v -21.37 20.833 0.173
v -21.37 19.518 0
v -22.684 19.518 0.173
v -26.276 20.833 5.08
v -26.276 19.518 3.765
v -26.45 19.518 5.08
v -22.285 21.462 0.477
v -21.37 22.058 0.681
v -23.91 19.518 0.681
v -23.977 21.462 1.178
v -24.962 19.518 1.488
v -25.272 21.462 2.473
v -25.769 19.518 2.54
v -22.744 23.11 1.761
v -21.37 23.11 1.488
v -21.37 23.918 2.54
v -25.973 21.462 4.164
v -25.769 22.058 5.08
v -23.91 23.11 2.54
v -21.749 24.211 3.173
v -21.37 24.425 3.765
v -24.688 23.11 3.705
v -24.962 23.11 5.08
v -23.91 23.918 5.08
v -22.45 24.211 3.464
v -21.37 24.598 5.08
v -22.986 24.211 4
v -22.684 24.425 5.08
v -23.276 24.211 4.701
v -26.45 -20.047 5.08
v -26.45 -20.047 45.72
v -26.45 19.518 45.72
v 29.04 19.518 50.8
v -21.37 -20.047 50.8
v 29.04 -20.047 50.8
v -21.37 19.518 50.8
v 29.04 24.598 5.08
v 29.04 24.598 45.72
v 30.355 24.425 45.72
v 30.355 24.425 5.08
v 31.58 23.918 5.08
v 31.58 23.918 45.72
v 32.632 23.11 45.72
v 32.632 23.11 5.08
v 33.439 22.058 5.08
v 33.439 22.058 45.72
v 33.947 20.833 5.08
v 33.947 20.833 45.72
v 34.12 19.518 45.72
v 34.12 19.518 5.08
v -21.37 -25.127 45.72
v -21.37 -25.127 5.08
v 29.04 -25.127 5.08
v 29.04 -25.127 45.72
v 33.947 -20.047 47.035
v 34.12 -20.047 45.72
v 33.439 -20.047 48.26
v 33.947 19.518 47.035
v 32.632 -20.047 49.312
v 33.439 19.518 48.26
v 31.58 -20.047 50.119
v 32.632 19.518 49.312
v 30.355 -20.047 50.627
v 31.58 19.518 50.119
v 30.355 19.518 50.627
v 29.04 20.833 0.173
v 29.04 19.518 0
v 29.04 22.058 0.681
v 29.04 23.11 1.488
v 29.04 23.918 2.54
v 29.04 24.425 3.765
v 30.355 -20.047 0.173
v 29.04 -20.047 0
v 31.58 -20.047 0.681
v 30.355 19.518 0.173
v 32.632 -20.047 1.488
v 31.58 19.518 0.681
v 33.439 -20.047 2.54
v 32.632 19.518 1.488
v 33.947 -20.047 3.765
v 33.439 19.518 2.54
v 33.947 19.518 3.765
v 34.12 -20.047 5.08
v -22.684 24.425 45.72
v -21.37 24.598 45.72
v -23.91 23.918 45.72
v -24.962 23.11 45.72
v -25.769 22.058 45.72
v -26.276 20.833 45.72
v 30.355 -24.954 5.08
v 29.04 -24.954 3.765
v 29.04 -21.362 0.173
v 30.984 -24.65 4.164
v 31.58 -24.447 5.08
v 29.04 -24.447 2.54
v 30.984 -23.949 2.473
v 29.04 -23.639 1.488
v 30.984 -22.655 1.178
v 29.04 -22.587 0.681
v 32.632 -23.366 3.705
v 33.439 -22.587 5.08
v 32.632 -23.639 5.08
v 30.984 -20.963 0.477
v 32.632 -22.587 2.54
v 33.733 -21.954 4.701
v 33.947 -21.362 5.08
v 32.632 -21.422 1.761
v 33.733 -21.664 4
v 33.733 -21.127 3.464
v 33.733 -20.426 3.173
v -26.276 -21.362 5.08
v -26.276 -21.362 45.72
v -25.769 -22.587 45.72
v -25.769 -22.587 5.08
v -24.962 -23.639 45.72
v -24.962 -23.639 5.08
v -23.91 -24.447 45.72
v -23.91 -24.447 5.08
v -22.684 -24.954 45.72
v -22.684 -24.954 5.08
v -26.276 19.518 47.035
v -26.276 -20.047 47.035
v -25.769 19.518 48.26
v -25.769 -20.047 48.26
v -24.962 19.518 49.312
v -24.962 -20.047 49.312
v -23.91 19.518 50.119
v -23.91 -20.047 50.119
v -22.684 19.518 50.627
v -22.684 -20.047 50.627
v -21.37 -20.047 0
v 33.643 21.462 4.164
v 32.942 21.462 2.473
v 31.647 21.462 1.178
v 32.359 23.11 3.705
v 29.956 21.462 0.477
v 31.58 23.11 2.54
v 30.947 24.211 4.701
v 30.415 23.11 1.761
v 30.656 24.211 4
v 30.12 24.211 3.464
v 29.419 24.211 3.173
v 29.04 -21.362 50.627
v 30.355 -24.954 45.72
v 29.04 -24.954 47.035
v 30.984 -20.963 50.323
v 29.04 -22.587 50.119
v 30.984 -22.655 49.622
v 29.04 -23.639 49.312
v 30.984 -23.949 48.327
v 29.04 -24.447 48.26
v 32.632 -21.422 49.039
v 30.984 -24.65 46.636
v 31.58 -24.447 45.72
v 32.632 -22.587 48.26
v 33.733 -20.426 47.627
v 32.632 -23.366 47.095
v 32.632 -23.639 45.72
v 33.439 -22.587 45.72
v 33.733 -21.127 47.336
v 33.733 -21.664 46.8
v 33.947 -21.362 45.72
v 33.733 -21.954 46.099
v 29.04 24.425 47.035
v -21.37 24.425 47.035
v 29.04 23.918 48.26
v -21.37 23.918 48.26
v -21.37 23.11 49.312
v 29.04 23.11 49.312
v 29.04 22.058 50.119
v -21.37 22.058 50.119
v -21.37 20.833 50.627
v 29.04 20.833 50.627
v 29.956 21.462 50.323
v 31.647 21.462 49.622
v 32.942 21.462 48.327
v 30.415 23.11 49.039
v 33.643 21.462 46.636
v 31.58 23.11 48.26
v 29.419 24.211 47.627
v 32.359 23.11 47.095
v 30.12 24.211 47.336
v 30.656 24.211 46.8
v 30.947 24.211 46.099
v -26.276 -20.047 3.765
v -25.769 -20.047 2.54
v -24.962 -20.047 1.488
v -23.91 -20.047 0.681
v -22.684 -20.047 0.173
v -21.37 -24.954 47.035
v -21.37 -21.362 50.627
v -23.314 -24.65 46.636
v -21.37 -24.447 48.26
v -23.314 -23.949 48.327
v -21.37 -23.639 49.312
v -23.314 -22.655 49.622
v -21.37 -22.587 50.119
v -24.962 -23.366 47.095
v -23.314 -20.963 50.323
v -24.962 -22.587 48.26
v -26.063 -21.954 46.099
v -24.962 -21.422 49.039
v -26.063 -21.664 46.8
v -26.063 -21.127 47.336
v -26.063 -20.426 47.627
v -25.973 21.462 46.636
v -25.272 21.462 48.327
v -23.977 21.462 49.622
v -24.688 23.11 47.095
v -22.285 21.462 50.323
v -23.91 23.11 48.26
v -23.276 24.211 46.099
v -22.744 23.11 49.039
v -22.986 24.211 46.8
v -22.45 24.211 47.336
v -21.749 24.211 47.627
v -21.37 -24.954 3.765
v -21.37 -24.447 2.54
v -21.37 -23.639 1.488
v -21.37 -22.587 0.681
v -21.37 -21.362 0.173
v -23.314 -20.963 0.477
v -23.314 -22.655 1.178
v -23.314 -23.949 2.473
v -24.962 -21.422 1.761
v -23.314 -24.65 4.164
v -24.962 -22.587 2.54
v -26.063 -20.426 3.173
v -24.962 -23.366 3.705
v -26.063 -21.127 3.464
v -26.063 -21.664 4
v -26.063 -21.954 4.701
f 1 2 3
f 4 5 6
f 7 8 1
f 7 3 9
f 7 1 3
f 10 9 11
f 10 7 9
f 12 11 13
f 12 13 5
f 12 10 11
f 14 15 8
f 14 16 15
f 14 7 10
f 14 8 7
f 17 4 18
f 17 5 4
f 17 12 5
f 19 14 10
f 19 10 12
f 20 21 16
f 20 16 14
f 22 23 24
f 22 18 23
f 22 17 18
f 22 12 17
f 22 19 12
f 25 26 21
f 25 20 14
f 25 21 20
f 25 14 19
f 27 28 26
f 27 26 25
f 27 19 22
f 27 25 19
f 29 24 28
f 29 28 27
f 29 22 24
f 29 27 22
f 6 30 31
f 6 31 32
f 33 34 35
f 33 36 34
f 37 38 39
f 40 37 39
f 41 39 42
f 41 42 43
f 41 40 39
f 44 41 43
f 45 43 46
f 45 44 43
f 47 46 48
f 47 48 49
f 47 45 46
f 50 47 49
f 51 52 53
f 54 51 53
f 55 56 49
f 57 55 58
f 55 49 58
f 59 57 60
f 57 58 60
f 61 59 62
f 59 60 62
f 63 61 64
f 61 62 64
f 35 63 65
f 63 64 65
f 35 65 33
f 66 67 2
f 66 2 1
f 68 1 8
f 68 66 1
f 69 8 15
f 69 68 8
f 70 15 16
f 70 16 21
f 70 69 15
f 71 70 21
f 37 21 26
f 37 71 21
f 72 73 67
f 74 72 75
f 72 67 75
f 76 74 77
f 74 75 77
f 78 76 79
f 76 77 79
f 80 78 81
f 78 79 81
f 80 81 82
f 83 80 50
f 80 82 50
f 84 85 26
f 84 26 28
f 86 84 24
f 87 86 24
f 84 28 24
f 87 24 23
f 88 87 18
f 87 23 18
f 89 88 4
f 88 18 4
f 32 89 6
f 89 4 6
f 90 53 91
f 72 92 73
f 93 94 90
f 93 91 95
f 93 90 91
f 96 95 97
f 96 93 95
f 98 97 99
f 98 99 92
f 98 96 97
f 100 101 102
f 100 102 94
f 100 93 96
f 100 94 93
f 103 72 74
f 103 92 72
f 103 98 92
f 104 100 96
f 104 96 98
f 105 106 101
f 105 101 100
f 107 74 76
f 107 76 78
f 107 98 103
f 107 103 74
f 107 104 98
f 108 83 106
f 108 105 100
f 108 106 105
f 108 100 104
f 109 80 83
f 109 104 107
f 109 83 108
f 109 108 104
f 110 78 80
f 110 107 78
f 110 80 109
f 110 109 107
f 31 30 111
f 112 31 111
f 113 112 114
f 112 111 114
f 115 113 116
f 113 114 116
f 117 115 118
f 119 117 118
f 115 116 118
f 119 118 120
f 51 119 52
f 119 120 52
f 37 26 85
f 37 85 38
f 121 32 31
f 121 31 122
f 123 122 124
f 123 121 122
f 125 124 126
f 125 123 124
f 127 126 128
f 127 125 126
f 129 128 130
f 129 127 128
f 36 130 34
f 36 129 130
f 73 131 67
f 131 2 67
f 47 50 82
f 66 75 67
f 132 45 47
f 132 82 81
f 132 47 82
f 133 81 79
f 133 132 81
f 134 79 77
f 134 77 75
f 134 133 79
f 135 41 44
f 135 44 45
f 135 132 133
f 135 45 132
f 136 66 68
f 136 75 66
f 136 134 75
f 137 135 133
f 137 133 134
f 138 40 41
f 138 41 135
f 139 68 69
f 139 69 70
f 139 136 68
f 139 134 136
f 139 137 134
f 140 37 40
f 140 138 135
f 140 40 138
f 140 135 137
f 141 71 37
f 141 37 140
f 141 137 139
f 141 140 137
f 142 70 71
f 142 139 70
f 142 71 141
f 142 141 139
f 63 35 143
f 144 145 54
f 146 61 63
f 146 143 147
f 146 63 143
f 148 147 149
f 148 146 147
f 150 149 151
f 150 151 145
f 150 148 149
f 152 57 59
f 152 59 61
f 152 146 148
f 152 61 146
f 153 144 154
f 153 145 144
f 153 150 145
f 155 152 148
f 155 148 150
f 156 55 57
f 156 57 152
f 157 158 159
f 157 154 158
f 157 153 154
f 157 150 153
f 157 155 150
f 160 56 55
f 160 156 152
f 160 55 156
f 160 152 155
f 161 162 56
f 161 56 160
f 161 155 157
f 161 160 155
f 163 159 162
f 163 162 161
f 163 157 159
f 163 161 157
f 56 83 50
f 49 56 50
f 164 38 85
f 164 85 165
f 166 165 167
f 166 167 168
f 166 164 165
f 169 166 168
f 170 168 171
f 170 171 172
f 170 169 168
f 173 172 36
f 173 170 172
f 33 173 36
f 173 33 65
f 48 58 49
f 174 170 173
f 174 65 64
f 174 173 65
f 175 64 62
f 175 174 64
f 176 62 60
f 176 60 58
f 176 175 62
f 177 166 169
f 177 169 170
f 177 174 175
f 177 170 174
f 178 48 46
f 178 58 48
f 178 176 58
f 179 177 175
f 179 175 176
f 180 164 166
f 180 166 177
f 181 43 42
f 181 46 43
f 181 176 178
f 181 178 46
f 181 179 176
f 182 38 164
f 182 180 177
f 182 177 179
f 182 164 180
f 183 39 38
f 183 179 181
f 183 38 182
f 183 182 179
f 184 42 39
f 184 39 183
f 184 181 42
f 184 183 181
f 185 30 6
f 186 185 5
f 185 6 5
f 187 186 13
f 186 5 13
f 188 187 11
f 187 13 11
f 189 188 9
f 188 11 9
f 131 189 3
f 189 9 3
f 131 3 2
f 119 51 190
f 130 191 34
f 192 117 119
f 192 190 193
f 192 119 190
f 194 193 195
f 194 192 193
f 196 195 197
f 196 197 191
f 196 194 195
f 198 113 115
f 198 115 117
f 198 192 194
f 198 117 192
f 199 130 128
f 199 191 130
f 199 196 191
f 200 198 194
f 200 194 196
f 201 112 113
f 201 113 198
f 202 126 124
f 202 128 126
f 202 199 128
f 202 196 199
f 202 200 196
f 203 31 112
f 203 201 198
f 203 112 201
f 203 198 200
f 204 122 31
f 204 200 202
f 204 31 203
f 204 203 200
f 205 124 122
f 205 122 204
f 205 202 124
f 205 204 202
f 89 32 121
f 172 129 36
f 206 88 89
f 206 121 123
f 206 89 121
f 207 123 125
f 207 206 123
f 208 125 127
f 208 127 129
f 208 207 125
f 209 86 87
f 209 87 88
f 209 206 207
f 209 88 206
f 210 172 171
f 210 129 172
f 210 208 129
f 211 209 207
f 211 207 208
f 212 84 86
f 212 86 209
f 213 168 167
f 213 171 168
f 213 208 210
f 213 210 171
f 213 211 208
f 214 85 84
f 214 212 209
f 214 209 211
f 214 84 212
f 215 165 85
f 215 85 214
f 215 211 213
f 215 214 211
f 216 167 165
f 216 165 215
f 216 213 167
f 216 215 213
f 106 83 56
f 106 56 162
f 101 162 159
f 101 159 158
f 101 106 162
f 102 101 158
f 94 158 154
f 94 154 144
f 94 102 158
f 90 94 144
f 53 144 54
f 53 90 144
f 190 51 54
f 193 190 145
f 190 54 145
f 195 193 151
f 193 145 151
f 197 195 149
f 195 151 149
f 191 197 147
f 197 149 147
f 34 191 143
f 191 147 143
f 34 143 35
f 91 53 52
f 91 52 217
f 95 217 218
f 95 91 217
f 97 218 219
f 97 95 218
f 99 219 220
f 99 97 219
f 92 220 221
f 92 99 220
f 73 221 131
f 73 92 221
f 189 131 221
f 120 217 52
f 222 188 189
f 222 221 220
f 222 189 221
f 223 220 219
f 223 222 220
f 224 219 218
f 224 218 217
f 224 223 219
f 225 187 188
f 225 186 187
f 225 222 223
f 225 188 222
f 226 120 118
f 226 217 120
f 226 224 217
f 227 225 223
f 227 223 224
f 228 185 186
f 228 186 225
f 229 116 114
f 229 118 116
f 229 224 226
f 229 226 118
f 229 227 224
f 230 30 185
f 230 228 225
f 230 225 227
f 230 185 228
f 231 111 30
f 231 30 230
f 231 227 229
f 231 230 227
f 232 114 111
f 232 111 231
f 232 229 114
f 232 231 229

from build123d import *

# Parameters (mm, degrees)
F0_W         = 60.5695545673
F0_H         = 49.7252251953
F1_DEPTH     = 50.8
F2_R         = 5.08
F3_R         = 5.08
F4_T1_DEPTH  = 40.64
F4_S5_W      = 5.08
F4_S5_H      = 5.08
F4_T6_DEPTH  = 5.08
F4_S11_W     = 5.08
F4_S11_H     = 5.08
F4_T12_DEPTH = 5.08
F4_S17_W     = 5.08
F4_S17_H     = 5.08
F4_T18_DEPTH = 5.08
F4_S23_W     = 5.08
F4_S23_H     = 5.08
F4_T24_DEPTH = 5.08
F4_S29_W     = 5.08
F4_S29_H     = 5.08
F4_T30_DEPTH = 5.08
F4_S35_W     = 5.08
F4_S35_H     = 5.08
F4_T36_DEPTH = 5.08
F4_S41_W     = 5.08
F4_S41_H     = 5.08
F4_T42_DEPTH = 5.08
F4_S47_W     = 5.08
F4_S47_H     = 5.08
F4_T48_DEPTH = 5.08


# Not quite as in the source:
# - a fillet or chamfer that OpenCascade refuses, or shapes differently, is made with other operations: its cross-section is extruded or revolved along the edge and cut away or added


with BuildPart() as f1:
    # F0 (on Top) → F1 (new body)
    with BuildSketch(Plane.XY):
        with Locations((3.8351900876, -0.2644965425)):
            Rectangle(F0_W, F0_H)
    extrude(amount=F1_DEPTH)

    # F2
    f2_edges = [f1.edges().sort_by_distance(p)[0] for p in [
        (3.83519, -25.127109, 50.8),
        (-26.449587, -0.264497, 50.8),
        (3.83519, 24.598116, 50.8),
        (34.119967, -0.264497, 50.8),
    ]]
    fillet(f2_edges, radius=F2_R)

    # F3
    f3_edges = [f1.edges().sort_by_distance(p)[0] for p in [
        (3.83519, -25.127109, 0),
        (34.119967, -0.264497, 0),
        (3.83519, 24.598116, 0),
        (-26.449587, -0.264497, 0),
    ]]
    fillet(f3_edges, radius=F3_R)

    # F4: fillet of radius 5.08 on 4 edges, made by hand

    # F4_s2 → F4_t1 (cut)
    with BuildSketch(Plane.XY.offset(5.08)):
        with BuildLine():
            ThreePointArc((-21.3695871961, 24.5981160551), (-24.9616896445, 23.1102185036), (-26.4495871961, 19.5181160551))
            Line((-26.4495871961, 19.5181160551), (-26.4495871961, 24.5981160551))
            Line((-26.4495871961, 24.5981160551), (-21.3695871961, 24.5981160551))
        make_face()
        with BuildLine():
            ThreePointArc((-26.4495871961, -20.0471091402), (-24.9616896445, -23.6392115886), (-21.3695871961, -25.1271091402))
            Line((-21.3695871961, -25.1271091402), (-26.4495871961, -25.1271091402))
            Line((-26.4495871961, -25.1271091402), (-26.4495871961, -20.0471091402))
        make_face()
        with BuildLine():
            ThreePointArc((29.0399673712, 24.5981160551), (32.6320698197, 23.1102185036), (34.1199673712, 19.5181160551))
            Line((34.1199673712, 19.5181160551), (34.1199673712, 24.5981160551))
            Line((34.1199673712, 24.5981160551), (29.0399673712, 24.5981160551))
        make_face()
        with BuildLine():
            ThreePointArc((34.1199673712, -20.0471091402), (32.6320698197, -23.6392115886), (29.0399673712, -25.1271091402))
            Line((29.0399673712, -25.1271091402), (34.1199673712, -25.1271091402))
            Line((34.1199673712, -25.1271091402), (34.1199673712, -20.0471091402))
        make_face()
    extrude(amount=F4_T1_DEPTH, mode=Mode.SUBTRACT)


with BuildPart() as f4_tool4:
    # F4_s5 → F4_t6 (new body)
    with BuildSketch(Plane.YZ.offset(29.0399673712)):
        with Locations((-22.5871091402, 2.54)):
            Rectangle(F4_S5_W, F4_S5_H)
    extrude(amount=F4_T6_DEPTH)

    # F4_s7 → F4_t8 (revolve, cut)
    with BuildSketch(Plane(origin=(29.0399673712, -20.0471091402, 5.08), x_dir=(0, 0.7071067812, 0.7071067812), z_dir=(0, 0.7071067812, -0.7071067812))):
        with BuildLine():
            ThreePointArc((0, -5.08), (5.08, 0), (0, 5.08))
            Line((0, 5.08), (0, -5.08))
        make_face()
    revolve(axis=Axis((29.0399673712, -20.0471091402, 5.08), (1, 0, 0)), mode=Mode.SUBTRACT)


with BuildPart() as f1_1:
    add(f1.part)

    # F4_t3: cut F4_tool4
    add(f4_tool4.part, mode=Mode.SUBTRACT)


with BuildPart() as f4_tool10:
    # F4_s11 → F4_t12 (new body)
    with BuildSketch(Plane.YZ.offset(29.0399673712)):
        with Locations((-22.5871091402, 48.26)):
            Rectangle(F4_S11_W, F4_S11_H)
    extrude(amount=F4_T12_DEPTH)

    # F4_s13 → F4_t14 (revolve, cut)
    with BuildSketch(Plane(origin=(29.0399673712, -20.0471091402, 45.72), x_dir=(0, 0.7071067812, -0.7071067812), z_dir=(0, -0.7071067812, -0.7071067812))):
        with BuildLine():
            ThreePointArc((0, -5.08), (5.08, 0), (0, 5.08))
            Line((0, 5.08), (0, -5.08))
        make_face()
    revolve(axis=Axis((29.0399673712, -20.0471091402, 45.72), (1, 0, 0)), mode=Mode.SUBTRACT)


with BuildPart() as f1_2:
    add(f1_1.part)

    # F4_t9: cut F4_tool10
    add(f4_tool10.part, mode=Mode.SUBTRACT)


with BuildPart() as f4_tool16:
    # F4_s17 → F4_t18 (new body)
    with BuildSketch(Plane.XZ.offset(-19.5181160551)):
        with Locations((31.5799673712, 2.54)):
            Rectangle(F4_S17_W, F4_S17_H)
    extrude(amount=-F4_T18_DEPTH)

    # F4_s19 → F4_t20 (revolve, cut)
    with BuildSketch(Plane(origin=(29.0399673712, 19.5181160551, 5.08), x_dir=(-0.7071067812, 0, 0.7071067812), z_dir=(-0.7071067812, 0, -0.7071067812))):
        with BuildLine():
            ThreePointArc((0, -5.08), (5.08, 0), (0, 5.08))
            Line((0, 5.08), (0, -5.08))
        make_face()
    revolve(axis=Axis((29.0399673712, 19.5181160551, 5.08), (0, 1, 0)), mode=Mode.SUBTRACT)


with BuildPart() as f1_3:
    add(f1_2.part)

    # F4_t15: cut F4_tool16
    add(f4_tool16.part, mode=Mode.SUBTRACT)


with BuildPart() as f4_tool22:
    # F4_s23 → F4_t24 (new body)
    with BuildSketch(Plane.XZ.offset(-19.5181160551)):
        with Locations((31.5799673712, 48.26)):
            Rectangle(F4_S23_W, F4_S23_H)
    extrude(amount=-F4_T24_DEPTH)

    # F4_s25 → F4_t26 (revolve, cut)
    with BuildSketch(Plane(origin=(29.0399673712, 19.5181160551, 45.72), x_dir=(-0.7071067812, 0, -0.7071067812), z_dir=(0.7071067812, 0, -0.7071067812))):
        with BuildLine():
            ThreePointArc((0, -5.08), (5.08, 0), (0, 5.08))
            Line((0, 5.08), (0, -5.08))
        make_face()
    revolve(axis=Axis((29.0399673712, 19.5181160551, 45.72), (0, 1, 0)), mode=Mode.SUBTRACT)


with BuildPart() as f1_4:
    add(f1_3.part)

    # F4_t21: cut F4_tool22
    add(f4_tool22.part, mode=Mode.SUBTRACT)


with BuildPart() as f4_tool28:
    # F4_s29 → F4_t30 (new body)
    with BuildSketch(Plane.YZ.offset(-21.3695871961)):
        with Locations((-22.5871091402, 2.54)):
            Rectangle(F4_S29_W, F4_S29_H)
    extrude(amount=-F4_T30_DEPTH)

    # F4_s31 → F4_t32 (revolve, cut)
    with BuildSketch(Plane(origin=(-21.3695871961, -20.0471091402, 5.08), x_dir=(0, 0.7071067812, 0.7071067812), z_dir=(0, -0.7071067812, 0.7071067812))):
        with BuildLine():
            ThreePointArc((0, -5.08), (5.08, 0), (0, 5.08))
            Line((0, 5.08), (0, -5.08))
        make_face()
    revolve(axis=Axis((-21.3695871961, -20.0471091402, 5.08), (-1, 0, 0)), mode=Mode.SUBTRACT)


with BuildPart() as f1_5:
    add(f1_4.part)

    # F4_t27: cut F4_tool28
    add(f4_tool28.part, mode=Mode.SUBTRACT)


with BuildPart() as f4_tool34:
    # F4_s35 → F4_t36 (new body)
    with BuildSketch(Plane.YZ.offset(-21.3695871961)):
        with Locations((-22.5871091402, 48.26)):
            Rectangle(F4_S35_W, F4_S35_H)
    extrude(amount=-F4_T36_DEPTH)

    # F4_s37 → F4_t38 (revolve, cut)
    with BuildSketch(Plane(origin=(-21.3695871961, -20.0471091402, 45.72), x_dir=(0, 0.7071067812, -0.7071067812), z_dir=(0, 0.7071067812, 0.7071067812))):
        with BuildLine():
            ThreePointArc((0, -5.08), (5.08, 0), (0, 5.08))
            Line((0, 5.08), (0, -5.08))
        make_face()
    revolve(axis=Axis((-21.3695871961, -20.0471091402, 45.72), (-1, 0, 0)), mode=Mode.SUBTRACT)


with BuildPart() as f1_6:
    add(f1_5.part)

    # F4_t33: cut F4_tool34
    add(f4_tool34.part, mode=Mode.SUBTRACT)


with BuildPart() as f4_tool40:
    # F4_s41 → F4_t42 (new body)
    with BuildSketch(Plane.XZ.offset(-19.5181160551)):
        with Locations((-23.9095871961, 2.54)):
            Rectangle(F4_S41_W, F4_S41_H)
    extrude(amount=-F4_T42_DEPTH)

    # F4_s43 → F4_t44 (revolve, cut)
    with BuildSketch(Plane(origin=(-21.3695871961, 19.5181160551, 5.08), x_dir=(0.7071067812, 0, 0.7071067812), z_dir=(-0.7071067812, 0, 0.7071067812))):
        with BuildLine():
            ThreePointArc((0, -5.08), (5.08, 0), (0, 5.08))
            Line((0, 5.08), (0, -5.08))
        make_face()
    revolve(axis=Axis((-21.3695871961, 19.5181160551, 5.08), (0, 1, 0)), mode=Mode.SUBTRACT)


with BuildPart() as f1_7:
    add(f1_6.part)

    # F4_t39: cut F4_tool40
    add(f4_tool40.part, mode=Mode.SUBTRACT)


with BuildPart() as f4_tool46:
    # F4_s47 → F4_t48 (new body)
    with BuildSketch(Plane.XZ.offset(-19.5181160551)):
        with Locations((-23.9095871961, 48.26)):
            Rectangle(F4_S47_W, F4_S47_H)
    extrude(amount=-F4_T48_DEPTH)

    # F4_s49 → F4_t50 (revolve, cut)
    with BuildSketch(Plane(origin=(-21.3695871961, 19.5181160551, 45.72), x_dir=(0.7071067812, 0, -0.7071067812), z_dir=(0.7071067812, 0, 0.7071067812))):
        with BuildLine():
            ThreePointArc((0, -5.08), (5.08, 0), (0, 5.08))
            Line((0, 5.08), (0, -5.08))
        make_face()
    revolve(axis=Axis((-21.3695871961, 19.5181160551, 45.72), (0, 1, 0)), mode=Mode.SUBTRACT)


with BuildPart() as f1_8:
    add(f1_7.part)

    # F4_t45: cut F4_tool46
    add(f4_tool46.part, mode=Mode.SUBTRACT)


solid = f1_8.part
